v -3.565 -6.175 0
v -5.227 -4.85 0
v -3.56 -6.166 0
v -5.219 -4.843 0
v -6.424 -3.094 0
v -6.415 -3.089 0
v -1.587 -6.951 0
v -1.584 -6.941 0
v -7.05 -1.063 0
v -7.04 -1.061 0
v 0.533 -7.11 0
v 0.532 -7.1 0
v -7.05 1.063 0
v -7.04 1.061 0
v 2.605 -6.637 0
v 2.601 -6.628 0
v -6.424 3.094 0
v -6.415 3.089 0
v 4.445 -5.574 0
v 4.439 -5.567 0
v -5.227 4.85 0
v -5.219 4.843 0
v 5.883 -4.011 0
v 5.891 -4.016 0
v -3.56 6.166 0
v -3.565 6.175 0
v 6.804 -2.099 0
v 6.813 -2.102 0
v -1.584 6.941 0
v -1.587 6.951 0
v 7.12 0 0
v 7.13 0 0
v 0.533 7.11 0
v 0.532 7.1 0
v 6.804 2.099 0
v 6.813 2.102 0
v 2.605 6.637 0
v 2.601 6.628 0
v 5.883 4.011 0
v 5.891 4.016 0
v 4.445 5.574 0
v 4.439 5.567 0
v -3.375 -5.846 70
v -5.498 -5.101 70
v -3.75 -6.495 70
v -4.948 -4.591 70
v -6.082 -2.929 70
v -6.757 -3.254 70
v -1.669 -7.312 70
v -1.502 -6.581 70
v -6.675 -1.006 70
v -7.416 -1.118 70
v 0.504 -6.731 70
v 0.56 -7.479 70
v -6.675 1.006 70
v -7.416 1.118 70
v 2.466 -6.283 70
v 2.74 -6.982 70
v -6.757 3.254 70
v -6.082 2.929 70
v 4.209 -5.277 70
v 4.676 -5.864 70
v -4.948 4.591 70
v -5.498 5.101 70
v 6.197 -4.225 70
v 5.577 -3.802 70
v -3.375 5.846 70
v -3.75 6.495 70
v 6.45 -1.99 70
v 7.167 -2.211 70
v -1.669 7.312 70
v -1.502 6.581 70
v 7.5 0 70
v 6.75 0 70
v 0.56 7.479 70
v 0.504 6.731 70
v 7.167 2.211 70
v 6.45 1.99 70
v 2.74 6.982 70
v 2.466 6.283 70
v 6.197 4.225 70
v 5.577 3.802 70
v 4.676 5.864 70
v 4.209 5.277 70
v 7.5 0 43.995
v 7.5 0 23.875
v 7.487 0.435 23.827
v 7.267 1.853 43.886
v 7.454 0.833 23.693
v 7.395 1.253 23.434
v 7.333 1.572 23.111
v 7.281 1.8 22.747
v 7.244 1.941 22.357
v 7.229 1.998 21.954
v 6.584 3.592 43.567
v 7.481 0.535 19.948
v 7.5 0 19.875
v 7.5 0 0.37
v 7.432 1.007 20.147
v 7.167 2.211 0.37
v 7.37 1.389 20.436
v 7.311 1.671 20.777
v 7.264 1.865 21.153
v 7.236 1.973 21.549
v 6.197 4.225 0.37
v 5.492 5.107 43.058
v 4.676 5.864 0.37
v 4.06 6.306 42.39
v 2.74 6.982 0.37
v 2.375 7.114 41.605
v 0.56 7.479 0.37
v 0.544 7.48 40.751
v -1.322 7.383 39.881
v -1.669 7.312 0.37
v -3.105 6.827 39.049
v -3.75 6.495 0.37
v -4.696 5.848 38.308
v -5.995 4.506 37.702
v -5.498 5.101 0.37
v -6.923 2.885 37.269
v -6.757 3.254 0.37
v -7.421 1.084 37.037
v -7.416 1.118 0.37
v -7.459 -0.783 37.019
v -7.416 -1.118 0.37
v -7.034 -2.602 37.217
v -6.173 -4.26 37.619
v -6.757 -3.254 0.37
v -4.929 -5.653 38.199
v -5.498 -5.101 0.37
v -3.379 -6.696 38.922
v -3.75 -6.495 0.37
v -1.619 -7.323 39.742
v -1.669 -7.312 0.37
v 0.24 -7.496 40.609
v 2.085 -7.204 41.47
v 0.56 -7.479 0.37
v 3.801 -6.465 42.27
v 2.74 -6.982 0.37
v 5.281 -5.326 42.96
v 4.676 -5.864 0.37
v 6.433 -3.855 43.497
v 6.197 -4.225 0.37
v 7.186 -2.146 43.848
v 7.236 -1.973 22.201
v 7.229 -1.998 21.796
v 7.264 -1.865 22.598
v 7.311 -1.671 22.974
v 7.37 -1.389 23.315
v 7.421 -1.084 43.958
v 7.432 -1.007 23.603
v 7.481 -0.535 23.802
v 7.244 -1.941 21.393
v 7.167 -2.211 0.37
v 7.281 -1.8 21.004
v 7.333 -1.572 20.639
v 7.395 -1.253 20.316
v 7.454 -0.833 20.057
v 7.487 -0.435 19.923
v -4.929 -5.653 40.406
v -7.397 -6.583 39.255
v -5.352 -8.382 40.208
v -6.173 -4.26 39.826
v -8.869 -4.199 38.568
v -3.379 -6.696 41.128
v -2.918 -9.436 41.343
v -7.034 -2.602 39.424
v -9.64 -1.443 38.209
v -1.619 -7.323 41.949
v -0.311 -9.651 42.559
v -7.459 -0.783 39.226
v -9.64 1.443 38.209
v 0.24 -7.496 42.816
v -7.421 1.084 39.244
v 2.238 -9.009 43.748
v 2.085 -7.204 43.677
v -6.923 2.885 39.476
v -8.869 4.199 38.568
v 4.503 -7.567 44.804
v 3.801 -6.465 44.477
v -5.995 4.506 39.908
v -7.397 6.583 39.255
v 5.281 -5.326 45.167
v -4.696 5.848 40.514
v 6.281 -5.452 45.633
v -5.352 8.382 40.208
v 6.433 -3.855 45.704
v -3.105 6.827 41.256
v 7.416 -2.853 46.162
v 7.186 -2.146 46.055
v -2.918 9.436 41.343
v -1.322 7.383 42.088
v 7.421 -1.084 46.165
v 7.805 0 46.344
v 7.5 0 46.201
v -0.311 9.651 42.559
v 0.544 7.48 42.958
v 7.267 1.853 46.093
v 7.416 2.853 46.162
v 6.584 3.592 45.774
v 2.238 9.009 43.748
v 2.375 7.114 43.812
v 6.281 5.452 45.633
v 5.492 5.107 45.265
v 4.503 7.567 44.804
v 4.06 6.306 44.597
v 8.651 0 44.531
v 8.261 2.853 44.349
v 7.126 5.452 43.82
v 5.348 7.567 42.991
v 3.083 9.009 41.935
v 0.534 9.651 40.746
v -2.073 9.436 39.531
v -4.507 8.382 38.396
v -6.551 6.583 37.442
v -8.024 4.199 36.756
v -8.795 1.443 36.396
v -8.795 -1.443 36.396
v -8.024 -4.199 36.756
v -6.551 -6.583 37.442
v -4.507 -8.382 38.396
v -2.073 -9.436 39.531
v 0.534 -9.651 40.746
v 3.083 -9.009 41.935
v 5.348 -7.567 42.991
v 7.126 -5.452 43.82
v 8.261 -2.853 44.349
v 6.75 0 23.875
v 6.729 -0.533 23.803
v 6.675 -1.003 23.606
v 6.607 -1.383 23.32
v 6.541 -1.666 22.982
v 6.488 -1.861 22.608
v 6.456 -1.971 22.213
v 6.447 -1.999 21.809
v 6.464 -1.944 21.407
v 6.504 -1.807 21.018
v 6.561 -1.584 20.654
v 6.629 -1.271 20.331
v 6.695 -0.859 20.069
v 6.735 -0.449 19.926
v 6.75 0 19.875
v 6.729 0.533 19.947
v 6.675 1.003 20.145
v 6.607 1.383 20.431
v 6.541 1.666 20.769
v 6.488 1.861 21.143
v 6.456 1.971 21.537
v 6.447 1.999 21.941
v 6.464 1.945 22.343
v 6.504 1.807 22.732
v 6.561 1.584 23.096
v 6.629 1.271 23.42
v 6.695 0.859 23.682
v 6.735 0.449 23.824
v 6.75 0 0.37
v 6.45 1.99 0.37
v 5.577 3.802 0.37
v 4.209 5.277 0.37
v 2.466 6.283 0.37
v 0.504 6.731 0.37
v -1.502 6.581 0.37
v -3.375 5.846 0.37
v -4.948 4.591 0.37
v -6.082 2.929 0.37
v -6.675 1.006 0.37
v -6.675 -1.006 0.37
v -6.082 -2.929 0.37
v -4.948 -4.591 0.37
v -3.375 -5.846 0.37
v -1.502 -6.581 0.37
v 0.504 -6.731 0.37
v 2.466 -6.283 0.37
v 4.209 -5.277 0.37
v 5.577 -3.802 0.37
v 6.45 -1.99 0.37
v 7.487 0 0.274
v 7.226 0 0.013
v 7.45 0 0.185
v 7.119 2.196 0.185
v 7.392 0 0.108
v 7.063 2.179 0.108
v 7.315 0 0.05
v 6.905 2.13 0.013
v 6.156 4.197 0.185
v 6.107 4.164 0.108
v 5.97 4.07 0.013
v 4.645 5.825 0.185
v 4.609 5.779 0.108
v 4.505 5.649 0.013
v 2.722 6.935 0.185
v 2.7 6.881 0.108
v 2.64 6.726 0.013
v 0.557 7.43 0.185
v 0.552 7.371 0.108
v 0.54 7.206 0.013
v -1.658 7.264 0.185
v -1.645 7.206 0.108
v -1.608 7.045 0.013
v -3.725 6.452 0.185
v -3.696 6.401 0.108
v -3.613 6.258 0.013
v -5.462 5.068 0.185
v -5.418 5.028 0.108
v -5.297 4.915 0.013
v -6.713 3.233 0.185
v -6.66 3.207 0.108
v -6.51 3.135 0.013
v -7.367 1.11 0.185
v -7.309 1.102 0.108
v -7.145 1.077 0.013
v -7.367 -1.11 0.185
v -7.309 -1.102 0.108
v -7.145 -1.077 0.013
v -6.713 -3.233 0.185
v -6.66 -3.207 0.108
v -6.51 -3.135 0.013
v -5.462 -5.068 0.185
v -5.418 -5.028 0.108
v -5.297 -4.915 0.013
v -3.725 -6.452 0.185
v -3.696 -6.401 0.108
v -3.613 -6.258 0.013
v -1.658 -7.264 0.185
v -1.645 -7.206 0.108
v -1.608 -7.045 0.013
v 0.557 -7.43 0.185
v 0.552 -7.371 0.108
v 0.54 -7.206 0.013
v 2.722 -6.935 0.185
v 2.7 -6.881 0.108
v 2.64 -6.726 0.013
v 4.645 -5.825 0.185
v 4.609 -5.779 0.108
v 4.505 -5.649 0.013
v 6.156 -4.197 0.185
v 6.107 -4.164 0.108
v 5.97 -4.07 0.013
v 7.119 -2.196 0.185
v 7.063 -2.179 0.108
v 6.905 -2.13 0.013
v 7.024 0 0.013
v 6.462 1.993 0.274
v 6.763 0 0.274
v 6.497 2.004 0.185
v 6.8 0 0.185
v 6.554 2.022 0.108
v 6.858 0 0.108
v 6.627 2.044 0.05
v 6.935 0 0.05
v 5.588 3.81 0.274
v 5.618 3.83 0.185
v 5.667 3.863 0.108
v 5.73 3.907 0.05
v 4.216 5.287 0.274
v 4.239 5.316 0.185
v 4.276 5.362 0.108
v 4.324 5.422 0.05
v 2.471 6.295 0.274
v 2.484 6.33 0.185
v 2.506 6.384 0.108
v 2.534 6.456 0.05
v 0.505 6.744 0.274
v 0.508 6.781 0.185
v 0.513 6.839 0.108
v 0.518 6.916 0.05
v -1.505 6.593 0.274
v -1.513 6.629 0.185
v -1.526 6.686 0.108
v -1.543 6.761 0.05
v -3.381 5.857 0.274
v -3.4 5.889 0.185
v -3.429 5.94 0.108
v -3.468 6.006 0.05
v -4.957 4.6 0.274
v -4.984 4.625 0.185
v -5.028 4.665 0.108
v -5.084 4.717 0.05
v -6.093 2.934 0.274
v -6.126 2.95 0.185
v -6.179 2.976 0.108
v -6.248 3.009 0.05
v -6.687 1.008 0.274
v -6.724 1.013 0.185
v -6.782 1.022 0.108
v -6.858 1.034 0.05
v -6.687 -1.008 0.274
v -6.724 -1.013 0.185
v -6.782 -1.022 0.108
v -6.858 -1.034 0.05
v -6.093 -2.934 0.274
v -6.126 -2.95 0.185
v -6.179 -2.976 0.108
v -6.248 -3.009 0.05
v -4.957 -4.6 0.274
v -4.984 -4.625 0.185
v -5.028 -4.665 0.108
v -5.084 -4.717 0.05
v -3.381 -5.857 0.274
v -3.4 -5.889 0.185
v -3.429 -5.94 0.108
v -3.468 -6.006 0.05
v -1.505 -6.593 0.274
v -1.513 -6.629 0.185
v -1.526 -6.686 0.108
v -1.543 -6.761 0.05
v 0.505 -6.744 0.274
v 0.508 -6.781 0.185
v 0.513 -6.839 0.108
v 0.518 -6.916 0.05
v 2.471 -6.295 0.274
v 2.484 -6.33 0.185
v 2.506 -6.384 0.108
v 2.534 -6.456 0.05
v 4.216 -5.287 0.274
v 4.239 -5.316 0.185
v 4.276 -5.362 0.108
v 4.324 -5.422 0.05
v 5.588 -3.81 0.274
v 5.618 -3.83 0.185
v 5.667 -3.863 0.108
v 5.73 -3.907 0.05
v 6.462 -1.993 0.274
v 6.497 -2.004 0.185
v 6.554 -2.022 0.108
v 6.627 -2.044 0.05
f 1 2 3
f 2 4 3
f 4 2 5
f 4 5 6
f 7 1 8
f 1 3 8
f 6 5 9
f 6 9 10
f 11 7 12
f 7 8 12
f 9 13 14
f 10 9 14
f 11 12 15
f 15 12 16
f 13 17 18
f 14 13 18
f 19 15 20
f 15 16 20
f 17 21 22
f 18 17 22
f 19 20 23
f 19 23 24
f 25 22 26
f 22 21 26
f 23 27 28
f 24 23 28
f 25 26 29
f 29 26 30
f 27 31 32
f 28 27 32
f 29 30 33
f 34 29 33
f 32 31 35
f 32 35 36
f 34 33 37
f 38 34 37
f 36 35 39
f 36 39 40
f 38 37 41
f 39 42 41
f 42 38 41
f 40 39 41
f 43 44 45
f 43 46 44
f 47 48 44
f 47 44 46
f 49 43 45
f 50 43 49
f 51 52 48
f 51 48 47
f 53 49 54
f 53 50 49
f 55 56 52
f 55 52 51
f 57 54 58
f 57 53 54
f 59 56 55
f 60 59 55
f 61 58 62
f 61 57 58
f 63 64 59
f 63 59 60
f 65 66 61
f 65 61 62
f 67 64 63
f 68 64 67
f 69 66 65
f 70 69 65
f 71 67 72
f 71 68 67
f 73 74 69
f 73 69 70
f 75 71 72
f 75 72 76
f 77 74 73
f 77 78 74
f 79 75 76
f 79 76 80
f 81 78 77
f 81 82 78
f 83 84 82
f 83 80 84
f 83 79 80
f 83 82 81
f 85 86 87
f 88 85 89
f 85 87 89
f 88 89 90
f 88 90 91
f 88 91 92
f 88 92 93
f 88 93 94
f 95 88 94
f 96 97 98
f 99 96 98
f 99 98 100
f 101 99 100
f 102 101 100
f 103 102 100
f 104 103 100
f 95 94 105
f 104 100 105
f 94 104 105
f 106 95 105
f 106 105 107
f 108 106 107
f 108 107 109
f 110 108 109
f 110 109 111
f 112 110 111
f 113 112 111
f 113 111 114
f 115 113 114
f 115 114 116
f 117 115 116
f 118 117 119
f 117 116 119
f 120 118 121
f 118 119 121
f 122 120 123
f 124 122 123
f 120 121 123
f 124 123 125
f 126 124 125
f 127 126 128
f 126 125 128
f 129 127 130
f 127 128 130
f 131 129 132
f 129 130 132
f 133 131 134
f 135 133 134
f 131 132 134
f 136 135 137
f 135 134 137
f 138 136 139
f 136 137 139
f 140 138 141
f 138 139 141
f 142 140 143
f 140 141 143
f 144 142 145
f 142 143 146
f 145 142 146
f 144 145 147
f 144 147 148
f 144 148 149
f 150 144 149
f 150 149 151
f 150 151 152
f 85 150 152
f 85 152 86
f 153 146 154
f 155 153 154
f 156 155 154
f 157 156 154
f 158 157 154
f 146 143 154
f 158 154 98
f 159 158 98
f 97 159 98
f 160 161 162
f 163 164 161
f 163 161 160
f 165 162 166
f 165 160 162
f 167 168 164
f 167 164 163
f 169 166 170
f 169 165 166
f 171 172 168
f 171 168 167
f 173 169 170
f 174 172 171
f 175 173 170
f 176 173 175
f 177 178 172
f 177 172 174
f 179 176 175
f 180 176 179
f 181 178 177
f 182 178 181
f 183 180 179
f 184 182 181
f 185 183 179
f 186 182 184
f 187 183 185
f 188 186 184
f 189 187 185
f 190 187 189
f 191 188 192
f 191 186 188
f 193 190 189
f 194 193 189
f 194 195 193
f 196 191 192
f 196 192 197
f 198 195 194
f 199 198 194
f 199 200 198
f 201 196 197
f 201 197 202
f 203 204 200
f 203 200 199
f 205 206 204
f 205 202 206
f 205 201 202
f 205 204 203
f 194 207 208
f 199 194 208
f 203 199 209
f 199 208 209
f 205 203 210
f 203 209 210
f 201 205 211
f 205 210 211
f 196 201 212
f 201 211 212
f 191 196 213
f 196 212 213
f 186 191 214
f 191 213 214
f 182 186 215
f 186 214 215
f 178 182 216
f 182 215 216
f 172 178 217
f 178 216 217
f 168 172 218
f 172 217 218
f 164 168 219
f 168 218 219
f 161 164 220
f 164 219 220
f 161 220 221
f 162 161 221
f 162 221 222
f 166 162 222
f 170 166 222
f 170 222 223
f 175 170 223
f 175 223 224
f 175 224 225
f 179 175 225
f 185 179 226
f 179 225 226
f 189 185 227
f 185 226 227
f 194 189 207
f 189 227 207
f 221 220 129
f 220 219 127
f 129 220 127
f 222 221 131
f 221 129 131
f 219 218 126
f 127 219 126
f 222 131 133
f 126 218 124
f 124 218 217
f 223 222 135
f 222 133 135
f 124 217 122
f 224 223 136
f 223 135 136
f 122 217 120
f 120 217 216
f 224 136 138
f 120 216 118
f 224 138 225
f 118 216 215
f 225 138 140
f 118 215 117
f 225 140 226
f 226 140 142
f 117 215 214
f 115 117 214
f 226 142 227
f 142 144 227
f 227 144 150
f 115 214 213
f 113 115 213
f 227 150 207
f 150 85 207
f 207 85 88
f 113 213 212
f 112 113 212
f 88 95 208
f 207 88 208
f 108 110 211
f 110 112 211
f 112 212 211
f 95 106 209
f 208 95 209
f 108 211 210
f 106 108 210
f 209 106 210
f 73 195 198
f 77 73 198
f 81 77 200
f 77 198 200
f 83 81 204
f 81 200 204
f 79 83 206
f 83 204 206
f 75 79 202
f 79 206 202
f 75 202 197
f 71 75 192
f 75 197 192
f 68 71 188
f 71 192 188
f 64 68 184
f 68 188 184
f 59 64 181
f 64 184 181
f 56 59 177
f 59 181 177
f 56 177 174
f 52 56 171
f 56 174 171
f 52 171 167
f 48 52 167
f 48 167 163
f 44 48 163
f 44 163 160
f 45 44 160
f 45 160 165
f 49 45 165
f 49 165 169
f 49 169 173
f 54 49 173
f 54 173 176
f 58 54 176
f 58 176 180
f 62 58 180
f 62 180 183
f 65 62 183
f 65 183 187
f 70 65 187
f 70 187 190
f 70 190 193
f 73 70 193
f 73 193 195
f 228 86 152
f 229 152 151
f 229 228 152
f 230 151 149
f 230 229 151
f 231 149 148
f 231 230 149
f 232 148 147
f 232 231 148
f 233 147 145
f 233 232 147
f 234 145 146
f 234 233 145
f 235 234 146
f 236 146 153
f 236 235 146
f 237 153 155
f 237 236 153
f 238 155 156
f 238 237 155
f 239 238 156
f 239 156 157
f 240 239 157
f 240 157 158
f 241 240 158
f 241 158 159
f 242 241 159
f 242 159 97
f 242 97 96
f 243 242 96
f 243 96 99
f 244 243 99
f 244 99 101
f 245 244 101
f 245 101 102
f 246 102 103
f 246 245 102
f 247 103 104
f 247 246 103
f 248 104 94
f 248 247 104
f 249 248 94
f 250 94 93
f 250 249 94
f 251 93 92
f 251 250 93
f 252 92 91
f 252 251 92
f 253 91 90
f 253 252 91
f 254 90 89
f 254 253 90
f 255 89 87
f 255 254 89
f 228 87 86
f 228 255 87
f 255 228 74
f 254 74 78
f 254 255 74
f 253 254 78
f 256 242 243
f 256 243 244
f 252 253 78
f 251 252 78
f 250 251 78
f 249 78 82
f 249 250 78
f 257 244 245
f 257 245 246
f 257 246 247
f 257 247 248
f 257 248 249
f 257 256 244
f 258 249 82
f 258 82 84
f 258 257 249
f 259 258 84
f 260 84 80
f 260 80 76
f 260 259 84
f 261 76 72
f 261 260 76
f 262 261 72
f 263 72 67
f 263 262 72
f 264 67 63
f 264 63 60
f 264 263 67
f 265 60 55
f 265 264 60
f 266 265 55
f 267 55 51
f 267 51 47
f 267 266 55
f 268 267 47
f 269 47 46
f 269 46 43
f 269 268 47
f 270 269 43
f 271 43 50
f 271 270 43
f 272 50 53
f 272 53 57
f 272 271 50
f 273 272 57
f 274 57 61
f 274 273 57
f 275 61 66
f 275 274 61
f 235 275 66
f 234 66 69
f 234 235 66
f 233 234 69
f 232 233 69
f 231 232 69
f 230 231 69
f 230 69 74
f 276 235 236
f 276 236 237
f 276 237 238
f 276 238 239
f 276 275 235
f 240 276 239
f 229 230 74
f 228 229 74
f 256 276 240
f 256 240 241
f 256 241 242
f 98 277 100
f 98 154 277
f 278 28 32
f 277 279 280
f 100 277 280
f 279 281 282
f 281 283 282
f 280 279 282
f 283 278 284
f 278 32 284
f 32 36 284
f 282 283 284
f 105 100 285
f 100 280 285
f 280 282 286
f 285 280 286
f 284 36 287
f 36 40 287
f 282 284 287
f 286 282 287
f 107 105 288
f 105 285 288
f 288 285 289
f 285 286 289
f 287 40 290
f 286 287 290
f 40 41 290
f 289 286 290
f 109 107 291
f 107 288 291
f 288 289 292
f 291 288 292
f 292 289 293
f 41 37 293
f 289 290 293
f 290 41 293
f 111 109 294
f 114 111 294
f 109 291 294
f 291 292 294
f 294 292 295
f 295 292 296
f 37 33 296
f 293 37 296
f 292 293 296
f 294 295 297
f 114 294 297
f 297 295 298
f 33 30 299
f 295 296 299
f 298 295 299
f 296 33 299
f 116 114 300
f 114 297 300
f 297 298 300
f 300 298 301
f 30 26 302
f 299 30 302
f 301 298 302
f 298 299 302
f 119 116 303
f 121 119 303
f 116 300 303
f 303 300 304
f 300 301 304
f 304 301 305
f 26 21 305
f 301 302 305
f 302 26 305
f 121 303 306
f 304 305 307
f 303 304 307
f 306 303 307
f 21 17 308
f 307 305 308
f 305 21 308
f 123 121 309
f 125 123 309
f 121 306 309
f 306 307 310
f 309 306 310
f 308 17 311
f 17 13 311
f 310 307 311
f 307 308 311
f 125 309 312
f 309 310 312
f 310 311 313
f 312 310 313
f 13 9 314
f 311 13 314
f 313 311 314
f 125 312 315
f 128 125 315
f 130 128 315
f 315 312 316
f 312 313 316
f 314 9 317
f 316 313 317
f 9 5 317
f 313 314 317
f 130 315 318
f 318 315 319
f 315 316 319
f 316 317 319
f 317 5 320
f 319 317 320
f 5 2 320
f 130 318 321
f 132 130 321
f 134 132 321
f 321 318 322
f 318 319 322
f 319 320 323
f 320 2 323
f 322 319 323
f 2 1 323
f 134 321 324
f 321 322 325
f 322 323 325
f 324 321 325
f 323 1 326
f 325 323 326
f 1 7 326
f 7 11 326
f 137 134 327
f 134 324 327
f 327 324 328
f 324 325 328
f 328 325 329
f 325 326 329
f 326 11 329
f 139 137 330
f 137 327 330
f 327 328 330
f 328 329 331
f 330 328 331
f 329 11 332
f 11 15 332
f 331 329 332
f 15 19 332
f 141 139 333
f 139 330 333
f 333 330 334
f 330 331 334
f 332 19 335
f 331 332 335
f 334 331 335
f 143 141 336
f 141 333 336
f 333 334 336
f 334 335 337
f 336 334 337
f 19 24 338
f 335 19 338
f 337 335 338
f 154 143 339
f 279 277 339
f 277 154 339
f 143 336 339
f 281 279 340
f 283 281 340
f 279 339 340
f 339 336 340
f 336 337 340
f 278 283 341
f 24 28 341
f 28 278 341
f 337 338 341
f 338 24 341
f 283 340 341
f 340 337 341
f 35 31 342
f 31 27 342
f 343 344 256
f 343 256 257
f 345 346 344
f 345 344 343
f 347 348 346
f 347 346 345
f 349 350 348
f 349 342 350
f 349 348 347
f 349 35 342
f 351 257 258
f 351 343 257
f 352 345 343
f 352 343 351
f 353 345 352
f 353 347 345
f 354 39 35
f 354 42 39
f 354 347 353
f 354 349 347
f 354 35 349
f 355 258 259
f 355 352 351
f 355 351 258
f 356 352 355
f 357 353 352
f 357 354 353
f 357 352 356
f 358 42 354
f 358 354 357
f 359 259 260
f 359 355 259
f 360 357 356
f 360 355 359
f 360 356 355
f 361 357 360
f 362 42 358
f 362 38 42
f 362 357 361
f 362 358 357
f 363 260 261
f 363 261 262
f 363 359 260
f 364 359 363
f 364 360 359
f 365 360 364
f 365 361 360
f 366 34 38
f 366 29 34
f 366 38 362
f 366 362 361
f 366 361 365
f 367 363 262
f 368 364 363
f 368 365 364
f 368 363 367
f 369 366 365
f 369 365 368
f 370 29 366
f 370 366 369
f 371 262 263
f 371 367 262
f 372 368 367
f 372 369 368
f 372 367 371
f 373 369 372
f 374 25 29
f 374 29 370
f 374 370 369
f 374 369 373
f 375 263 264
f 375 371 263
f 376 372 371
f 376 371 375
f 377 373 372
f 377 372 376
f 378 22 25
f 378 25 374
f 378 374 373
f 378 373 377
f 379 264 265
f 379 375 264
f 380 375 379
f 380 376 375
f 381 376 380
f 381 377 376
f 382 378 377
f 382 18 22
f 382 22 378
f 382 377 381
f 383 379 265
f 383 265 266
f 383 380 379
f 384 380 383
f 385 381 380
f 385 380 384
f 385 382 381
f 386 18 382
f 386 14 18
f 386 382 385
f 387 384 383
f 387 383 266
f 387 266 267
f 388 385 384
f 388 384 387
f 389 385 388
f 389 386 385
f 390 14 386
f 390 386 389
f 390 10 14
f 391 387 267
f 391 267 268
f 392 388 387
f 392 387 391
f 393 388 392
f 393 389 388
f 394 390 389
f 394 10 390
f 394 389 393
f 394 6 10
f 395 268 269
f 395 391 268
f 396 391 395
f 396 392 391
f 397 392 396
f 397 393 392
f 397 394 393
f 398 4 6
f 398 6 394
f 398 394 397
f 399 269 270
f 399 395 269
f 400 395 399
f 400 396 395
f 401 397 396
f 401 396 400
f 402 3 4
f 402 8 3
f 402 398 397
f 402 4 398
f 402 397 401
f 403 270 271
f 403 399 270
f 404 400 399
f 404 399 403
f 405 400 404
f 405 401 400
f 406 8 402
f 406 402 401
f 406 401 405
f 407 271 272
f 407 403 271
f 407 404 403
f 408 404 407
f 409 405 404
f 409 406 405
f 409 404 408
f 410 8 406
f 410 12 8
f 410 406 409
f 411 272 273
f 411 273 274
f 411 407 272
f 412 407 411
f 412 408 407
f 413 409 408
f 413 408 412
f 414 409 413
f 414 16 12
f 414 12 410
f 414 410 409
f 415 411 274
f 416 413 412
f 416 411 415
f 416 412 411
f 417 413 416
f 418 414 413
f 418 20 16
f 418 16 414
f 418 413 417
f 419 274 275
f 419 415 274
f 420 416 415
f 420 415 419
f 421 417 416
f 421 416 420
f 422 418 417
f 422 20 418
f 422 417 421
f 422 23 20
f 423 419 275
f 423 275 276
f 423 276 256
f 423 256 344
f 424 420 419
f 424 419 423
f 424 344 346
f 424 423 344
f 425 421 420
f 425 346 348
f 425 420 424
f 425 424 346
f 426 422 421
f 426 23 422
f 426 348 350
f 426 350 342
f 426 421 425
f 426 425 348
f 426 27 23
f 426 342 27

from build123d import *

# Parameters (mm, degrees)
SKETCH1_R           = 7.5
SKETCH1_R_2         = 6.75
BOSS_EXTRUDE1_DEPTH = 70
FILLET2_R           = 0.37
SKETCH8_R           = 9.678517052
BOSS_EXTRUDE6_DEPTH = 2
SKETCH9_R           = 6.75
CUT_EXTRUDE2_DEPTH  = 72
SKETCH10_R          = 2
CUT_EXTRUDE3_DEPTH  = 10


with BuildPart() as part:
    # Sketch1 → Boss-Extrude1 (new body)
    with BuildSketch(Plane.XY):
        Circle(SKETCH1_R)
        Circle(SKETCH1_R_2, mode=Mode.SUBTRACT)
    extrude(amount=BOSS_EXTRUDE1_DEPTH)

    # Fillet2
    fillet2_edges = [part.edges().sort_by_distance(p)[0] for p in [
        (-7.5, 0, 0),
        (-6.75, 0, 0),
    ]]
    fillet(fillet2_edges, radius=FILLET2_R)

    # Sketch8 → Boss-Extrude6 (add)
    with BuildSketch(Plane(origin=(-15.511368661, 0, 33.264237441), x_dir=(0, -1, 0), z_dir=(-0.4226182617407003, 0, 0.9063077870366496))):
        with Locations(Location((0, 16.981195542, 0), (0, 0, 90))):
            Circle(SKETCH8_R)
    extrude(amount=BOSS_EXTRUDE6_DEPTH)

    # Sketch9 → Cut-Extrude2 (cut)
    with BuildSketch(Plane.XY):
        Circle(SKETCH9_R)
    extrude(amount=CUT_EXTRUDE2_DEPTH, mode=Mode.SUBTRACT)

    # Sketch10 → Cut-Extrude3 (cut)
    with BuildSketch(Plane(origin=(0, 0, 0), x_dir=(0, 0, -1), z_dir=(1, 0, 0))):
        with Locations(Location((-21.875209452, 0, 0), (0, 0, 180))):
            Circle(SKETCH10_R)
    extrude(amount=CUT_EXTRUDE3_DEPTH, mode=Mode.SUBTRACT)


solid = part.part
